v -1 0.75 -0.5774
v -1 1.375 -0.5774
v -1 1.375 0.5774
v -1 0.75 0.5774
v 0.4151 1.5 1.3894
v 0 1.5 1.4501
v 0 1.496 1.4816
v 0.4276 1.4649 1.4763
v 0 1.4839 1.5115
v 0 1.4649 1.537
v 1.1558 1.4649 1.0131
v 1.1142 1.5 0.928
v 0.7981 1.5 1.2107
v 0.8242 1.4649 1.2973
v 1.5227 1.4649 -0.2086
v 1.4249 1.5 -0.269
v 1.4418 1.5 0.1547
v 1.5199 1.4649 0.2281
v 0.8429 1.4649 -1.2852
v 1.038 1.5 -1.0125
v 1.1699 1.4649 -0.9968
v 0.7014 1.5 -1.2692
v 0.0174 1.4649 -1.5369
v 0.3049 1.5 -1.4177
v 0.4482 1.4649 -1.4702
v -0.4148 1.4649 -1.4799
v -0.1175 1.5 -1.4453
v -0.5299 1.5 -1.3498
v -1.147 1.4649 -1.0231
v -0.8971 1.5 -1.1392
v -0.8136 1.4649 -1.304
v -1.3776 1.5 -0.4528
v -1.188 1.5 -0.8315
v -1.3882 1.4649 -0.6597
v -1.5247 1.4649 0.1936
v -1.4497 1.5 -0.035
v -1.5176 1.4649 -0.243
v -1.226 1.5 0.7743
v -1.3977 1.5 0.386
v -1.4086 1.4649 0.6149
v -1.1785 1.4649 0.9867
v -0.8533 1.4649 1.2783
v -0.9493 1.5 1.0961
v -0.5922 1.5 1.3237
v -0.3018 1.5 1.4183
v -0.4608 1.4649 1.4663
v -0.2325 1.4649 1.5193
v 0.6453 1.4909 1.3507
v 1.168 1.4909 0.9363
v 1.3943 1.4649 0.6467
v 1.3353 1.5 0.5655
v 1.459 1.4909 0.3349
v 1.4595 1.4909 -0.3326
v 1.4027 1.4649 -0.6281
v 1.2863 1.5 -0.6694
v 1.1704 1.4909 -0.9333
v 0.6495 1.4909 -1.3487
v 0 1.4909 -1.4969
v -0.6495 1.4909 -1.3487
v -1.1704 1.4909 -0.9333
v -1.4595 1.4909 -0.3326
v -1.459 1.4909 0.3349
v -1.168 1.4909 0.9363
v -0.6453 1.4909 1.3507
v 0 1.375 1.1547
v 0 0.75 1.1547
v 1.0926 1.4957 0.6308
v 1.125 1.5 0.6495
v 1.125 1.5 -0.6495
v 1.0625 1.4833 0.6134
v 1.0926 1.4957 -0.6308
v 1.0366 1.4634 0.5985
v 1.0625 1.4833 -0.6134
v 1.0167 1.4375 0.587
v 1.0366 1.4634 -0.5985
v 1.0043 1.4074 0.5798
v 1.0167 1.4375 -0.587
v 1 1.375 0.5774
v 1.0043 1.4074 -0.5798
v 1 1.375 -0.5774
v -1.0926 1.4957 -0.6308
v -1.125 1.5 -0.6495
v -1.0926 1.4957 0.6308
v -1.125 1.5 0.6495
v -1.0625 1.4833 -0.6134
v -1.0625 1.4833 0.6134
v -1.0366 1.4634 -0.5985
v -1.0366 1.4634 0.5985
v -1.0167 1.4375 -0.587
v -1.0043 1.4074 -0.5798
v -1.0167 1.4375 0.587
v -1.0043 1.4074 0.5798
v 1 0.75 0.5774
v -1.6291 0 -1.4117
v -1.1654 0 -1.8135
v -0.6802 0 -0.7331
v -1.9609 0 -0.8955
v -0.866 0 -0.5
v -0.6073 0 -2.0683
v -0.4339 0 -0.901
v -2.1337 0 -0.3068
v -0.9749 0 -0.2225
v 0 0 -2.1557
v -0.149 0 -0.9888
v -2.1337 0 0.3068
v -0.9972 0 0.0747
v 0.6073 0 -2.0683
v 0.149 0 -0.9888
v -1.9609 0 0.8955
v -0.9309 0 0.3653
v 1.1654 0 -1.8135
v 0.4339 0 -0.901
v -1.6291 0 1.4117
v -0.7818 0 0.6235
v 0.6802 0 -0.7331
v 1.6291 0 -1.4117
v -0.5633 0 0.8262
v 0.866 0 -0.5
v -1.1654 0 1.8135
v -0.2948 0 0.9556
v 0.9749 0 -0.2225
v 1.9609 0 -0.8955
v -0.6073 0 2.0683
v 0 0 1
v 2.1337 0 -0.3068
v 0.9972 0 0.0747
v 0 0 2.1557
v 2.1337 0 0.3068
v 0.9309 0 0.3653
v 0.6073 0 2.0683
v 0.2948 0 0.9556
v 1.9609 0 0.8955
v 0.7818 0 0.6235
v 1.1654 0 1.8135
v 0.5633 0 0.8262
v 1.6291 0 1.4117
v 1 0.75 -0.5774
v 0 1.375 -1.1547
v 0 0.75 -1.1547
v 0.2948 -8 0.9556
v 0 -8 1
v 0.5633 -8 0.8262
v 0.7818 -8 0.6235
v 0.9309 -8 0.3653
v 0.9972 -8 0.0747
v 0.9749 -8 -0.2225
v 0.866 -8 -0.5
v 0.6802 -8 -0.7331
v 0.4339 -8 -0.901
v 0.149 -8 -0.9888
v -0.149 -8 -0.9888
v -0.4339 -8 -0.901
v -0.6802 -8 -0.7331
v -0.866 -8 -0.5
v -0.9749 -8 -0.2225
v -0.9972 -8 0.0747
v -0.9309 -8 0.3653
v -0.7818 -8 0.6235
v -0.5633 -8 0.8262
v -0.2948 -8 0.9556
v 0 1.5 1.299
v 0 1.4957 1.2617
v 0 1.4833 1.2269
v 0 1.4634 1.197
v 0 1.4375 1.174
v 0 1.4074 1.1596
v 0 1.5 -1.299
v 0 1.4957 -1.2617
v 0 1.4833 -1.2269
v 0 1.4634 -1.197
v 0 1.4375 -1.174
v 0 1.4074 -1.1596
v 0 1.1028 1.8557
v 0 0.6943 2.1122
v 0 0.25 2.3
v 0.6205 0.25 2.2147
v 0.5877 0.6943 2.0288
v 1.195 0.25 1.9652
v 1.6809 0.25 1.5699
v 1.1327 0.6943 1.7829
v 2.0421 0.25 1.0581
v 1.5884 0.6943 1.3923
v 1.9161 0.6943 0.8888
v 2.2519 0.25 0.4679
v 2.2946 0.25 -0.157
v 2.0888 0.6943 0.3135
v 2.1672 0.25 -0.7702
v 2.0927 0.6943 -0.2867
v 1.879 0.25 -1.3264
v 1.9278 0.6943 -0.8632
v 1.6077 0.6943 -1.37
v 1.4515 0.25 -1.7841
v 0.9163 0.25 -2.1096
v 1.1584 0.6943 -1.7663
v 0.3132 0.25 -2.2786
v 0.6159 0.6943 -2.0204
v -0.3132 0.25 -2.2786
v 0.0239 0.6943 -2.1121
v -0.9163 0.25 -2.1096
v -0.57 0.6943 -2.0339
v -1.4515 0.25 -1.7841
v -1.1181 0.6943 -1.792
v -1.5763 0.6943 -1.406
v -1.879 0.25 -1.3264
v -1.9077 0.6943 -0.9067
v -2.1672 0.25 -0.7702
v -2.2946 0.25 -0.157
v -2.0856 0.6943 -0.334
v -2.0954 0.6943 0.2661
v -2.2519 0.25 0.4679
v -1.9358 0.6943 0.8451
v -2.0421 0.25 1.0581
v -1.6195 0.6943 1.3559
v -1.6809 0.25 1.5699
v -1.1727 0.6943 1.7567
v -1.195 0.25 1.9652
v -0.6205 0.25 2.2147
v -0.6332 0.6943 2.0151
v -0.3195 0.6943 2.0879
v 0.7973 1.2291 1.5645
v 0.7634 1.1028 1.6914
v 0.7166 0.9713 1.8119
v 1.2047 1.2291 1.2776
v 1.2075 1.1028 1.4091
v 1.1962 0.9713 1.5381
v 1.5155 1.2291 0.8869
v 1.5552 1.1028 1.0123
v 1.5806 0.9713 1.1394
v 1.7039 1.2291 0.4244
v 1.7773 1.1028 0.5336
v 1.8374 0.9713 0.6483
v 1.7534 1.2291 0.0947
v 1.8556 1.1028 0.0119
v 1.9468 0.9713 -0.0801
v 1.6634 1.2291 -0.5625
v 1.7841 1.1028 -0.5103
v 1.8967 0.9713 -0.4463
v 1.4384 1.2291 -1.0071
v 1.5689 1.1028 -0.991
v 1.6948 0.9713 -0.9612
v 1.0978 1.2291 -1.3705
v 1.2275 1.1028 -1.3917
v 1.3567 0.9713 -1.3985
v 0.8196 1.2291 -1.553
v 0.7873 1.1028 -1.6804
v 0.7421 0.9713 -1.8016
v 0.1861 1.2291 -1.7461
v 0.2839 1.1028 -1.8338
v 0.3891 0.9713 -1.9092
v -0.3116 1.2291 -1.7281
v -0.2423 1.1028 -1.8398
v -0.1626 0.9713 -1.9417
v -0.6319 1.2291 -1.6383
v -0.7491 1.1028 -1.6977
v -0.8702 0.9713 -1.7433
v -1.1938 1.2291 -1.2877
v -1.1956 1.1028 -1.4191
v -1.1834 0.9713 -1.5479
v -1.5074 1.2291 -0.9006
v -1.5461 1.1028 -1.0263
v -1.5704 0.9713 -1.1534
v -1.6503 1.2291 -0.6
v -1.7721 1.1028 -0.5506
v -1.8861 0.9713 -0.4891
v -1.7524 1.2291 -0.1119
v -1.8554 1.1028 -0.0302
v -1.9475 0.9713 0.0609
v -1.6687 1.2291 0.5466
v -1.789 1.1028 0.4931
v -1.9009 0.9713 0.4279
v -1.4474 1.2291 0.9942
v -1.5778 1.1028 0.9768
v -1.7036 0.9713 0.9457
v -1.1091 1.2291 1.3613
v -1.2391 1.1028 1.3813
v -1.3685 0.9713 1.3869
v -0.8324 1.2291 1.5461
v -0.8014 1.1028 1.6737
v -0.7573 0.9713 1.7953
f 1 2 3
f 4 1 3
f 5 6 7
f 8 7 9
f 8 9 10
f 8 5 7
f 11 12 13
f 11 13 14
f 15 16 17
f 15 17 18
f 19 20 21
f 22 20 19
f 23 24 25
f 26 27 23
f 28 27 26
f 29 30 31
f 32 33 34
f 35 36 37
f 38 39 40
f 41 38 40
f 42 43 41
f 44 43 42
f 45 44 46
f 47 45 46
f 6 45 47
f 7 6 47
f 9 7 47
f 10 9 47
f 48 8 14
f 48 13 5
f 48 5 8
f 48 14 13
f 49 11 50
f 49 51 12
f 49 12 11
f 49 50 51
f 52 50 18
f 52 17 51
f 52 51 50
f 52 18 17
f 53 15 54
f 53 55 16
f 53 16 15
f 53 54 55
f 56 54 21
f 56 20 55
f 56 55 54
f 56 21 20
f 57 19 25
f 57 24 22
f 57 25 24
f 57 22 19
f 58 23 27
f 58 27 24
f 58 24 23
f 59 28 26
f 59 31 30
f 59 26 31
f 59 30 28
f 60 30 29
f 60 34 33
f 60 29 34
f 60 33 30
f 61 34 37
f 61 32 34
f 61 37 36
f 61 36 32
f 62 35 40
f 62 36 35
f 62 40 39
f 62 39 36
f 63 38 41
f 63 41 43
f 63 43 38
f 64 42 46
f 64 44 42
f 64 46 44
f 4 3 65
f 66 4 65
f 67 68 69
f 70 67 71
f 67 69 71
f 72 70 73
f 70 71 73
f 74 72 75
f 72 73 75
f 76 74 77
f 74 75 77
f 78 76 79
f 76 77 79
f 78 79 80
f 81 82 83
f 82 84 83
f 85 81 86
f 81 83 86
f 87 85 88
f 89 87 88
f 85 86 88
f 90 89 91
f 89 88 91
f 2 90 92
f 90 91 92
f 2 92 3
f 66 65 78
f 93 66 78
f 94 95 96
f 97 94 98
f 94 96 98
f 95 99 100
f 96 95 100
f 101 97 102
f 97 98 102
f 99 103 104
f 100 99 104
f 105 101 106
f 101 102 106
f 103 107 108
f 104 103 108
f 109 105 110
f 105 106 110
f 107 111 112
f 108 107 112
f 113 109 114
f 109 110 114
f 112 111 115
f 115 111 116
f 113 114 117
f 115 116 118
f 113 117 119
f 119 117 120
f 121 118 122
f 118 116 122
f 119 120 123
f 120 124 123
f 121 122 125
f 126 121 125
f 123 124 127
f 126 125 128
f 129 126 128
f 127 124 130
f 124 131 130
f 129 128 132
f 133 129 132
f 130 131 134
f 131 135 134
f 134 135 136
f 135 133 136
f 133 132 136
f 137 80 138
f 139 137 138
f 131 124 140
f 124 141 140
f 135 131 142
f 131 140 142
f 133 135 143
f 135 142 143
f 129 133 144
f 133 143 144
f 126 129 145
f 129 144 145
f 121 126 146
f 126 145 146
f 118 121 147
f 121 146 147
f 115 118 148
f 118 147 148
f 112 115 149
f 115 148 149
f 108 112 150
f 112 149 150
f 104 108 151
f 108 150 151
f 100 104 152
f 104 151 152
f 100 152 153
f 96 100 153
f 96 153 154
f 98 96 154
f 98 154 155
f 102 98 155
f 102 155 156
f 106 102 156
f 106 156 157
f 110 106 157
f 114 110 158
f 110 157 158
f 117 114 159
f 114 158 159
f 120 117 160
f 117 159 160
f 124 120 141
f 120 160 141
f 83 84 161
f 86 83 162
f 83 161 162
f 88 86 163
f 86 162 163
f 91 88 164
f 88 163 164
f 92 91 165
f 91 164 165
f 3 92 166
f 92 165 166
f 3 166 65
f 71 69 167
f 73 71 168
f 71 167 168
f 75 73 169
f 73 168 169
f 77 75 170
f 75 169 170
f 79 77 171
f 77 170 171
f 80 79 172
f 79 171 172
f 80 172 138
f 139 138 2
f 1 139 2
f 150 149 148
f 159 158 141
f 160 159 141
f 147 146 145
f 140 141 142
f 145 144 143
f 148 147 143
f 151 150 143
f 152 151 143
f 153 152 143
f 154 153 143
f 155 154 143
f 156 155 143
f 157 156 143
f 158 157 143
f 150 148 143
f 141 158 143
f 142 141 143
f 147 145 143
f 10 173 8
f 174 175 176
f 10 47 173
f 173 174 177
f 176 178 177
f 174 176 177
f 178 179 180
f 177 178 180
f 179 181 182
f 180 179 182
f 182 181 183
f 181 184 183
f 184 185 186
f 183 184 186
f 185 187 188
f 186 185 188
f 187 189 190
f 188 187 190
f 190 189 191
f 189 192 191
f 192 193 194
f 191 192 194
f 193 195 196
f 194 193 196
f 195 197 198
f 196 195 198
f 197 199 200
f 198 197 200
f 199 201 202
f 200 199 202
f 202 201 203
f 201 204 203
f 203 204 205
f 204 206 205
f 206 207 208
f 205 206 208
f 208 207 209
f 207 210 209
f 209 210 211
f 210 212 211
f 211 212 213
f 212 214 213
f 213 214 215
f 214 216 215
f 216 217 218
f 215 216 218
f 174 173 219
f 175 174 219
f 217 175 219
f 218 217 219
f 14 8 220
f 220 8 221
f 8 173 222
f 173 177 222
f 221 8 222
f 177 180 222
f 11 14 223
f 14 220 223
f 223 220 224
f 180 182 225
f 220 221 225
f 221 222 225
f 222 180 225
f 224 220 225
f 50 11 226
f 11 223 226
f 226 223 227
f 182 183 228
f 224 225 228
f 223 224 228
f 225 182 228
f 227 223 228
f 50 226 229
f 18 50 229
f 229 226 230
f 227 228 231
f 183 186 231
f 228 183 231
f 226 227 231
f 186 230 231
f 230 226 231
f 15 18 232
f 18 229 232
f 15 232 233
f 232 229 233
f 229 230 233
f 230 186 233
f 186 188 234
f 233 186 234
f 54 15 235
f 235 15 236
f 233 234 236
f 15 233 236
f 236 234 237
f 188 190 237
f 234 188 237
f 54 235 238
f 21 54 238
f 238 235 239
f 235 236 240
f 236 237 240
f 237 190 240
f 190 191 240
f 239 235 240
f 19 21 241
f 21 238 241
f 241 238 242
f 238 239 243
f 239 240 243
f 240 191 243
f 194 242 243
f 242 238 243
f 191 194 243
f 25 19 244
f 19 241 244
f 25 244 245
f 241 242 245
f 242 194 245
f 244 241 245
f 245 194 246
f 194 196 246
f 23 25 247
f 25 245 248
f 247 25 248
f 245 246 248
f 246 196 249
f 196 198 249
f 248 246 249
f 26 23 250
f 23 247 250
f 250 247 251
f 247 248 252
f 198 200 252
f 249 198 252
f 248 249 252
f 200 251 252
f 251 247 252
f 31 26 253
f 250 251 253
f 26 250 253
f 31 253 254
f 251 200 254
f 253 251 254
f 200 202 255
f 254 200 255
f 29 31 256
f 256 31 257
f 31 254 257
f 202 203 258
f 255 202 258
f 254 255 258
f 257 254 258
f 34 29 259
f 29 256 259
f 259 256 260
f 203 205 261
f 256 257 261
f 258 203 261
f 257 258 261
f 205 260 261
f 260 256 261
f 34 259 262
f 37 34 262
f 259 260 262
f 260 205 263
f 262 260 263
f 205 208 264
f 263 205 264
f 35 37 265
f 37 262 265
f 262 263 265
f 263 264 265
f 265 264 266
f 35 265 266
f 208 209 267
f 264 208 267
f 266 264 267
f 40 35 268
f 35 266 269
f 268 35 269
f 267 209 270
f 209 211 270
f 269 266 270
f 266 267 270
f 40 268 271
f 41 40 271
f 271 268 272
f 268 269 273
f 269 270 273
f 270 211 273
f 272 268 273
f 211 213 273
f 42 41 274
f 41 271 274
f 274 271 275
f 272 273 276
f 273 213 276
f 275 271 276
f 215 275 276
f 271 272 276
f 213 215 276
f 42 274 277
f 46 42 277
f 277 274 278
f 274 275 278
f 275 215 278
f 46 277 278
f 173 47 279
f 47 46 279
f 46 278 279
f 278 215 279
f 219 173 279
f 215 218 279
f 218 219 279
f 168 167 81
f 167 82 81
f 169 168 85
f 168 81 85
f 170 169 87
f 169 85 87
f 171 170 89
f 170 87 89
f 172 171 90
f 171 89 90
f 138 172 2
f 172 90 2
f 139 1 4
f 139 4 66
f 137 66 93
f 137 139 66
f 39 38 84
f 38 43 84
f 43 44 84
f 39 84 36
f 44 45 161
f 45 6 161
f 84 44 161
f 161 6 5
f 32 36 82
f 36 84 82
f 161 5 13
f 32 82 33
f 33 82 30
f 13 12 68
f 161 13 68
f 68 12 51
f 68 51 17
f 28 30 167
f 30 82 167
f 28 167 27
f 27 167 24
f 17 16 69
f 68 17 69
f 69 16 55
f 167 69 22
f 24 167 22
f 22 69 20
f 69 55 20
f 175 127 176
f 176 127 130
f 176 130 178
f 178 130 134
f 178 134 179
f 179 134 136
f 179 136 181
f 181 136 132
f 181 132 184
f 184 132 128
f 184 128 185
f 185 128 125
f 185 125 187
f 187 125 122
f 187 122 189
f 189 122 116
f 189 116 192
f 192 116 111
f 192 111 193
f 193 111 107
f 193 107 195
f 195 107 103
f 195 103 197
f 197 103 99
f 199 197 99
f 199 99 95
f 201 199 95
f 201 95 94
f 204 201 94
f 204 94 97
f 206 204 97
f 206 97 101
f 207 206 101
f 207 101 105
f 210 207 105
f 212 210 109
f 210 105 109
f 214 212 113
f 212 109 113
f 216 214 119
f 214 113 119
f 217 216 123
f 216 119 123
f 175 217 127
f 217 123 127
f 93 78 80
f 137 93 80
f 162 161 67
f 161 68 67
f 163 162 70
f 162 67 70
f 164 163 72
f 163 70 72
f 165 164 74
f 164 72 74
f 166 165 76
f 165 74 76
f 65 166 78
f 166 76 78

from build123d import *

# Parameters (mm, degrees)
CUT_EXTRUDE1_DEPTH = 0.75
FILLET1_R          = 0.125


with BuildPart() as part:
    # Sketch1 → Revolve1 (revolve)
    with BuildSketch(Plane(origin=(0, 0, 0), x_dir=(0, 0, -1), z_dir=(1, 0, 0))):
        with BuildLine():
            Line((0, 1.5), (-1.5, 1.5))
            ThreePointArc((-1.5, 1.5), (-1.978515811, 0.925250119), (-2.3, 0.25))
            Line((-2.3, 0.25), (-2.155662433, 0))
            Line((-2.155662433, 0), (-1, 0))
            Line((-1, 0), (-1, -8))
            Line((-1, -8), (0, -8))
            Line((0, -8), (0, 1.5))
        make_face()
    revolve(axis=Axis((0, -8, 0), (0, 1, 0)))

    # Sketch2 → Cut-Extrude1 (cut)
    with BuildSketch(Plane(origin=(0, 1.5, 0), x_dir=(1, 0, 0), z_dir=(0, 1, 0))):
        Polygon((0, 1.154700538), (-1, 0.577350269), (-1, -0.577350269), (0, -1.154700538), (1, -0.577350269), (1, 0.577350269), align=None)
    extrude(amount=-CUT_EXTRUDE1_DEPTH, mode=Mode.SUBTRACT)

    # Fillet1
    fillet1_edges = [part.edges().sort_by_distance(p)[0] for p in [
        (0.5, 1.5, -0.866025404),
        (-0.5, 1.5, -0.866025404),
        (-1, 1.5, 0),
        (-0.5, 1.5, 0.866025404),
        (0.5, 1.5, 0.866025404),
        (1, 1.5, 0),
        (0, 1.5, -1.5),
    ]]
    fillet(fillet1_edges, radius=FILLET1_R)


solid = part.part
